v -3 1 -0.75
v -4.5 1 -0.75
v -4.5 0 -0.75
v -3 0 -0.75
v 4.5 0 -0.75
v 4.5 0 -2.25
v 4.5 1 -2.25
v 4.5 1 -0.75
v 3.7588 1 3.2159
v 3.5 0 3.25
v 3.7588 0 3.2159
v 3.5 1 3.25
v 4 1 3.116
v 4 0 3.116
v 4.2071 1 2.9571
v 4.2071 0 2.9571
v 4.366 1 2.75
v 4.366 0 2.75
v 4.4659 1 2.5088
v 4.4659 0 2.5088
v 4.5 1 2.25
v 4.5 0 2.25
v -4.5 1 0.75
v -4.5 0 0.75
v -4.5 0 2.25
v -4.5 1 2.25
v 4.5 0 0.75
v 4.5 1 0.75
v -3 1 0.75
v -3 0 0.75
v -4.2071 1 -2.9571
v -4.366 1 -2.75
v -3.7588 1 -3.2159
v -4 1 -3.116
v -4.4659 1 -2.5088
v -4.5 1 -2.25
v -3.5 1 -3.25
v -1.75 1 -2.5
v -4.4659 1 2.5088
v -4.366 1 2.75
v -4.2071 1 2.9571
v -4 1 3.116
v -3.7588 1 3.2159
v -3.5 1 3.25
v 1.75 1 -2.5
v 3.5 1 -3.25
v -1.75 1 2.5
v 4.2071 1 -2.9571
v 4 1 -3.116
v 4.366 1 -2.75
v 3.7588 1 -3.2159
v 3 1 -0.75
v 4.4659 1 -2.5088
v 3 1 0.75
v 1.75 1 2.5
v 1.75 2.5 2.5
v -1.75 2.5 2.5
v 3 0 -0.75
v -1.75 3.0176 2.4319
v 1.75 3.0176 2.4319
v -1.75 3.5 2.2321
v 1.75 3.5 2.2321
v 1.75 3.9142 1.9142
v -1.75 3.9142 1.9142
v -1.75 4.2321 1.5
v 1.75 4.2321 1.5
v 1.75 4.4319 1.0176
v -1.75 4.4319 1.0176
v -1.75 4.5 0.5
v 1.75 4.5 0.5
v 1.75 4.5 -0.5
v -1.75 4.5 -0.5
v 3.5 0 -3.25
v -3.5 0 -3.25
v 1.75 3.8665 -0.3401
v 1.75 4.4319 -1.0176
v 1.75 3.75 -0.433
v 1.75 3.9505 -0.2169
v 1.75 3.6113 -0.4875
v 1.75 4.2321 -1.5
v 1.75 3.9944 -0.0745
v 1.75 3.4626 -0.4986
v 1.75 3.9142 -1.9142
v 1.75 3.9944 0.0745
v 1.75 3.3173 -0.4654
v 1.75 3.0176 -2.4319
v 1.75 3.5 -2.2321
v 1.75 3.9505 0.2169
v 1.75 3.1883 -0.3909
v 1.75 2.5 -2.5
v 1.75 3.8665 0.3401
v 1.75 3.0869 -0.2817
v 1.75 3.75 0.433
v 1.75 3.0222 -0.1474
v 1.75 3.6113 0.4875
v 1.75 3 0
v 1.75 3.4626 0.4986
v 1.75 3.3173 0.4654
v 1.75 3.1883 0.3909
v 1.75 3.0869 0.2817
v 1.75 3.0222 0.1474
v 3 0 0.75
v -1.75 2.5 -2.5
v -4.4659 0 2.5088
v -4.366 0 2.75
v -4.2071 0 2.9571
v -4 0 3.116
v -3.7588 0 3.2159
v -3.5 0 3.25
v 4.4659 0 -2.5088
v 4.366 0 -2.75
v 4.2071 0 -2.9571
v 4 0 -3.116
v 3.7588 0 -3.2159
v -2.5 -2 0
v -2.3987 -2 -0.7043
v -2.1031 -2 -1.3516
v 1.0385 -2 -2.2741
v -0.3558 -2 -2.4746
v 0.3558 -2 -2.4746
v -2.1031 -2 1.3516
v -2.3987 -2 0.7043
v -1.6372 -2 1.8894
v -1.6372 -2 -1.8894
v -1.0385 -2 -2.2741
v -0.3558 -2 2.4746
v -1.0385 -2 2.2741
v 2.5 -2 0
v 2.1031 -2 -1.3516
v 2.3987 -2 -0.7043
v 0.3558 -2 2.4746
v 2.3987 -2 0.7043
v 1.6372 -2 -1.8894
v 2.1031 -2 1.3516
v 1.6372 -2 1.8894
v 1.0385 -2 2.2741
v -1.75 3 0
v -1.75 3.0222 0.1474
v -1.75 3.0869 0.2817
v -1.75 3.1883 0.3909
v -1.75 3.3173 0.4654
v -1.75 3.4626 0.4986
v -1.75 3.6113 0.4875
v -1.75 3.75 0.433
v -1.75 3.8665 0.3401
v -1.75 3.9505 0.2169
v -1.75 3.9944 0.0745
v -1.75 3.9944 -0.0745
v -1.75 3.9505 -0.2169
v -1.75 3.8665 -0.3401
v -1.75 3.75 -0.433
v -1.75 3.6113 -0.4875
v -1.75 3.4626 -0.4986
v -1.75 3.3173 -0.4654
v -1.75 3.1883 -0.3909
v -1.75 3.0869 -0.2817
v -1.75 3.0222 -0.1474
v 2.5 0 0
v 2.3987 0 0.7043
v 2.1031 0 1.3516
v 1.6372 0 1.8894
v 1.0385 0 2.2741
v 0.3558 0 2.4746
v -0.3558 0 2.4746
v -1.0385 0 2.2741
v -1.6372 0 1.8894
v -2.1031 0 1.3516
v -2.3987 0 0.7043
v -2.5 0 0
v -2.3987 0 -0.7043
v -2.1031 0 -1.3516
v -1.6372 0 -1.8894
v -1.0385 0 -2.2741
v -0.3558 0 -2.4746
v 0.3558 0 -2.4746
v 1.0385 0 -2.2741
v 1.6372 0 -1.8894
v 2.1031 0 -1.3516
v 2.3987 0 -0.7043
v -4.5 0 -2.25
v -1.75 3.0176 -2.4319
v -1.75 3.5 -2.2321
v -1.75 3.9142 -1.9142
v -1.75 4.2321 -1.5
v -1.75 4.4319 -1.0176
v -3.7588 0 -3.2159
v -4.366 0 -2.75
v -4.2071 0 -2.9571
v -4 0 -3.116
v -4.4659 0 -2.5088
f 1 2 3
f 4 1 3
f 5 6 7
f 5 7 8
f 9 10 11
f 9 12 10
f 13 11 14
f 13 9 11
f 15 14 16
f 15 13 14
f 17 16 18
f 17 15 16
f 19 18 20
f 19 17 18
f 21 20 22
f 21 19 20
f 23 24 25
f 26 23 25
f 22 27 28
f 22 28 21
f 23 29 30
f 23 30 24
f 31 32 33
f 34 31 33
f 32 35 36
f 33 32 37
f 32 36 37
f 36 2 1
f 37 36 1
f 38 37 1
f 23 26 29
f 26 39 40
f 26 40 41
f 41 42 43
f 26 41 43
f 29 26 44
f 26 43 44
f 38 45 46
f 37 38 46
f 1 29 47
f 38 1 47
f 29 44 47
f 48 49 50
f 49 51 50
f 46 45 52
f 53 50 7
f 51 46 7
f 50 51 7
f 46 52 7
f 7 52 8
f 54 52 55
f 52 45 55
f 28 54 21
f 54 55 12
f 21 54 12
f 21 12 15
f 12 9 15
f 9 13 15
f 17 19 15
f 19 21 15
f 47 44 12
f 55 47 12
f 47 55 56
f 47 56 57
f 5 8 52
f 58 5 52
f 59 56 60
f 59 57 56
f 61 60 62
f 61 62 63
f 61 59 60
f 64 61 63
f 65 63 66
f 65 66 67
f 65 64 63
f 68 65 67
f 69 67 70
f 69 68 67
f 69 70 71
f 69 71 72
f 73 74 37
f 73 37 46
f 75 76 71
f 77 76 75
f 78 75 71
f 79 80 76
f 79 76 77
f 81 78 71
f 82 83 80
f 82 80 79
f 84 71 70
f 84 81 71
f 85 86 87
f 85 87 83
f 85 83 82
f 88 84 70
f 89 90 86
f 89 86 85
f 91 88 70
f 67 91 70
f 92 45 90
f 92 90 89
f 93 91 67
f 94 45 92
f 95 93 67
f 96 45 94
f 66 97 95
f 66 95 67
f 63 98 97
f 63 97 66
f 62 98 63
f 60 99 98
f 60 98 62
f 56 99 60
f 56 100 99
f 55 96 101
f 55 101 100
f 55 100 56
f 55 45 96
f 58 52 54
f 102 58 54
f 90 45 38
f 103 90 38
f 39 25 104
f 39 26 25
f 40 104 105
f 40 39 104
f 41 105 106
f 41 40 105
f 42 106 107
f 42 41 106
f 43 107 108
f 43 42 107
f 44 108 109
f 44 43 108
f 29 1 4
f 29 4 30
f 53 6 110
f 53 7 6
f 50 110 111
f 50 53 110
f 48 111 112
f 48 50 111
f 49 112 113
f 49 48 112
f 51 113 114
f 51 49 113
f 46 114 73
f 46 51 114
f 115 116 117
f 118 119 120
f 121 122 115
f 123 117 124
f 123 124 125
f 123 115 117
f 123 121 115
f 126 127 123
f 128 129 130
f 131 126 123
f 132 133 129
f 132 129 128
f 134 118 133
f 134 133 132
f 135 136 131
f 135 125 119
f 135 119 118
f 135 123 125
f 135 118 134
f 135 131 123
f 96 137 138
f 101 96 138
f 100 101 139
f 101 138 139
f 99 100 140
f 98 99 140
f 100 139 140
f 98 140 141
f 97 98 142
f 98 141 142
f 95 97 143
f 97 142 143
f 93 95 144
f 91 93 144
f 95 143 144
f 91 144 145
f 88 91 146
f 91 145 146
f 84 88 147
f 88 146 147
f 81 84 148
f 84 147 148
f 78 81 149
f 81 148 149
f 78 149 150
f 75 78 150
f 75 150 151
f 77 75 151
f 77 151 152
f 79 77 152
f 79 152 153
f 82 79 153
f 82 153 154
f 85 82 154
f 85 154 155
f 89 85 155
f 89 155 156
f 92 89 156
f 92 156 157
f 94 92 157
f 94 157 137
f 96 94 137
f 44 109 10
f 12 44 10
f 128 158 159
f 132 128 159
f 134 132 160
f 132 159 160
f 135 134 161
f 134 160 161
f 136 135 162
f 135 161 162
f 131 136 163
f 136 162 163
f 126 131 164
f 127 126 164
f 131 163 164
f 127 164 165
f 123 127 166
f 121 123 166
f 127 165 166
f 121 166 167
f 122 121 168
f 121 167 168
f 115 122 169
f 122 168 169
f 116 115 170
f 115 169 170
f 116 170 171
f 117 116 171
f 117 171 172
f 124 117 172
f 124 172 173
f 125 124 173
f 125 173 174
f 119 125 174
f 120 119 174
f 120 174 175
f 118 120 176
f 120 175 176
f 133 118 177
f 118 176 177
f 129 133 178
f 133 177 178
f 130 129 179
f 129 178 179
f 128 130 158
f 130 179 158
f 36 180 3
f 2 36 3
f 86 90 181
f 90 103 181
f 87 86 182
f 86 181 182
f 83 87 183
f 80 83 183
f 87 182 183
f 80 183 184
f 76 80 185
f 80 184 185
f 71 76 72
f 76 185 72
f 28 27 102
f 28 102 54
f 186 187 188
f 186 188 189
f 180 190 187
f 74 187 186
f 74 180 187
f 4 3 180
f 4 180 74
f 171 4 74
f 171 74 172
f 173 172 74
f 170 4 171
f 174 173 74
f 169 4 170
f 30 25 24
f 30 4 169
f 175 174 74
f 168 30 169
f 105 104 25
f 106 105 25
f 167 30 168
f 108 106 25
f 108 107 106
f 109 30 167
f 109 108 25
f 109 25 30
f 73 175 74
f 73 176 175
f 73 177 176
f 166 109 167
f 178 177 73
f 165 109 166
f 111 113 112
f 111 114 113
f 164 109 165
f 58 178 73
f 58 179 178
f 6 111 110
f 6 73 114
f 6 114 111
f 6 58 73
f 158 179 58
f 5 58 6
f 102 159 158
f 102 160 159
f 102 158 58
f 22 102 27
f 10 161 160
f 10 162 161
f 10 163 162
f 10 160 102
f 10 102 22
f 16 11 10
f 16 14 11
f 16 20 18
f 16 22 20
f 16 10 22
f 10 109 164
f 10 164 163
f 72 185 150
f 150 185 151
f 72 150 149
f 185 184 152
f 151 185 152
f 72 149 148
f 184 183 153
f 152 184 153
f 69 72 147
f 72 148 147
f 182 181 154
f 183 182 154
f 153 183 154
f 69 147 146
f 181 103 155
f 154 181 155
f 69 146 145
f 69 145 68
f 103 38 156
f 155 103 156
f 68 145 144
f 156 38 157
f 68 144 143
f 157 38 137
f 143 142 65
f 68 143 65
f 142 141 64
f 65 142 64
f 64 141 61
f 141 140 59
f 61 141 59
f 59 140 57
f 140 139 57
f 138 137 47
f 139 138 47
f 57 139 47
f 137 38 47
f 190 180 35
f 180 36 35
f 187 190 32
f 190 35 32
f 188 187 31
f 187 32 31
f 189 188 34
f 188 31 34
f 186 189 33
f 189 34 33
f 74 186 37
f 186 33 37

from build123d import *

# Parameters (mm, degrees)
F0_R      = 2.5
F1_DEPTH  = 2
F2_W      = 9
F2_H      = 6.5
F3_DEPTH  = 1
F4_W      = 3.5
F4_H      = 5
F5_DEPTH  = 3.5
F6_R      = 0.5
F7_DEPTH  = 25
F8_R      = 2
F9_W      = 1
F9_H      = 1.5
F10_DEPTH = 1
F11_W     = 1
F11_H     = 1.5
F12_DEPTH = 1
F13_R     = 1
F15_W     = 0.5
F15_H     = 1.5
F14_W     = 0.5
F14_H     = 1.5
F16_DEPTH = 25


with BuildPart() as f1:
    # F0 (on Front) → F1 (new body)
    with BuildSketch(Plane.XZ):
        Circle(F0_R)
    extrude(amount=F1_DEPTH)

    # F2 (on Front) → F3 (join)
    with BuildSketch(Plane.XZ):
        Rectangle(F2_W, F2_H)
    extrude(amount=-F3_DEPTH)

    # F4 (on face) → F5 (join)
    with BuildSketch(Plane(origin=(0, 1, 0), x_dir=(-1, 0, 0), z_dir=(0, 1, 0))):
        Rectangle(F4_W, F4_H)
    extrude(amount=F5_DEPTH)

    # F6 (on face) → F7 (cut)
    with BuildSketch(Plane(origin=(-1.75, 0, 0), x_dir=(0, -1, 0), z_dir=(-1, 0, 0))):
        with Locations((-3.5, 0)):
            Circle(F6_R)
    extrude(amount=-F7_DEPTH, mode=Mode.SUBTRACT)

    # F8
    f8_edges = [f1.edges().sort_by_distance(p)[0] for p in [
        (0, 4.5, -2.5),
        (0, 4.5, 2.5),
    ]]
    fillet(f8_edges, radius=F8_R)

    # F9 (on face) → F10 (cut)
    with BuildSketch(Plane(origin=(-4.5, 0, 0), x_dir=(0, -1, 0), z_dir=(-1, 0, 0))):
        with Locations((-0.5, 0)):
            Rectangle(F9_W, F9_H)
    extrude(amount=-F10_DEPTH, mode=Mode.SUBTRACT)

    # F11 (on face) → F12 (cut)
    with BuildSketch(Plane.YZ.offset(4.5)):
        with Locations((0.5, 0)):
            Rectangle(F11_W, F11_H)
    extrude(amount=-F12_DEPTH, mode=Mode.SUBTRACT)

    # F13
    f13_edges = [f1.edges().sort_by_distance(p)[0] for p in [
        (4.5, 0.5, 3.25),
        (4.5, 0.5, -3.25),
        (-4.5, 0.5, -3.25),
        (-4.5, 0.5, 3.25),
    ]]
    fillet(f13_edges, radius=F13_R)

    # F15 (on face) + F14 (on face) → F16 (cut)
    with BuildSketch(Plane(origin=(0, 1, 0), x_dir=(-1, 0, 0), z_dir=(0, 1, 0))):
        with Locations((3.25, 0)):
            Rectangle(F15_W, F15_H)
    with BuildSketch(Plane(origin=(0, 1, 0), x_dir=(-1, 0, 0), z_dir=(0, 1, 0))):
        with Locations((-3.25, 0)):
            Rectangle(F14_W, F14_H)
    extrude(amount=-F16_DEPTH, mode=Mode.SUBTRACT)


solid = f1.part
